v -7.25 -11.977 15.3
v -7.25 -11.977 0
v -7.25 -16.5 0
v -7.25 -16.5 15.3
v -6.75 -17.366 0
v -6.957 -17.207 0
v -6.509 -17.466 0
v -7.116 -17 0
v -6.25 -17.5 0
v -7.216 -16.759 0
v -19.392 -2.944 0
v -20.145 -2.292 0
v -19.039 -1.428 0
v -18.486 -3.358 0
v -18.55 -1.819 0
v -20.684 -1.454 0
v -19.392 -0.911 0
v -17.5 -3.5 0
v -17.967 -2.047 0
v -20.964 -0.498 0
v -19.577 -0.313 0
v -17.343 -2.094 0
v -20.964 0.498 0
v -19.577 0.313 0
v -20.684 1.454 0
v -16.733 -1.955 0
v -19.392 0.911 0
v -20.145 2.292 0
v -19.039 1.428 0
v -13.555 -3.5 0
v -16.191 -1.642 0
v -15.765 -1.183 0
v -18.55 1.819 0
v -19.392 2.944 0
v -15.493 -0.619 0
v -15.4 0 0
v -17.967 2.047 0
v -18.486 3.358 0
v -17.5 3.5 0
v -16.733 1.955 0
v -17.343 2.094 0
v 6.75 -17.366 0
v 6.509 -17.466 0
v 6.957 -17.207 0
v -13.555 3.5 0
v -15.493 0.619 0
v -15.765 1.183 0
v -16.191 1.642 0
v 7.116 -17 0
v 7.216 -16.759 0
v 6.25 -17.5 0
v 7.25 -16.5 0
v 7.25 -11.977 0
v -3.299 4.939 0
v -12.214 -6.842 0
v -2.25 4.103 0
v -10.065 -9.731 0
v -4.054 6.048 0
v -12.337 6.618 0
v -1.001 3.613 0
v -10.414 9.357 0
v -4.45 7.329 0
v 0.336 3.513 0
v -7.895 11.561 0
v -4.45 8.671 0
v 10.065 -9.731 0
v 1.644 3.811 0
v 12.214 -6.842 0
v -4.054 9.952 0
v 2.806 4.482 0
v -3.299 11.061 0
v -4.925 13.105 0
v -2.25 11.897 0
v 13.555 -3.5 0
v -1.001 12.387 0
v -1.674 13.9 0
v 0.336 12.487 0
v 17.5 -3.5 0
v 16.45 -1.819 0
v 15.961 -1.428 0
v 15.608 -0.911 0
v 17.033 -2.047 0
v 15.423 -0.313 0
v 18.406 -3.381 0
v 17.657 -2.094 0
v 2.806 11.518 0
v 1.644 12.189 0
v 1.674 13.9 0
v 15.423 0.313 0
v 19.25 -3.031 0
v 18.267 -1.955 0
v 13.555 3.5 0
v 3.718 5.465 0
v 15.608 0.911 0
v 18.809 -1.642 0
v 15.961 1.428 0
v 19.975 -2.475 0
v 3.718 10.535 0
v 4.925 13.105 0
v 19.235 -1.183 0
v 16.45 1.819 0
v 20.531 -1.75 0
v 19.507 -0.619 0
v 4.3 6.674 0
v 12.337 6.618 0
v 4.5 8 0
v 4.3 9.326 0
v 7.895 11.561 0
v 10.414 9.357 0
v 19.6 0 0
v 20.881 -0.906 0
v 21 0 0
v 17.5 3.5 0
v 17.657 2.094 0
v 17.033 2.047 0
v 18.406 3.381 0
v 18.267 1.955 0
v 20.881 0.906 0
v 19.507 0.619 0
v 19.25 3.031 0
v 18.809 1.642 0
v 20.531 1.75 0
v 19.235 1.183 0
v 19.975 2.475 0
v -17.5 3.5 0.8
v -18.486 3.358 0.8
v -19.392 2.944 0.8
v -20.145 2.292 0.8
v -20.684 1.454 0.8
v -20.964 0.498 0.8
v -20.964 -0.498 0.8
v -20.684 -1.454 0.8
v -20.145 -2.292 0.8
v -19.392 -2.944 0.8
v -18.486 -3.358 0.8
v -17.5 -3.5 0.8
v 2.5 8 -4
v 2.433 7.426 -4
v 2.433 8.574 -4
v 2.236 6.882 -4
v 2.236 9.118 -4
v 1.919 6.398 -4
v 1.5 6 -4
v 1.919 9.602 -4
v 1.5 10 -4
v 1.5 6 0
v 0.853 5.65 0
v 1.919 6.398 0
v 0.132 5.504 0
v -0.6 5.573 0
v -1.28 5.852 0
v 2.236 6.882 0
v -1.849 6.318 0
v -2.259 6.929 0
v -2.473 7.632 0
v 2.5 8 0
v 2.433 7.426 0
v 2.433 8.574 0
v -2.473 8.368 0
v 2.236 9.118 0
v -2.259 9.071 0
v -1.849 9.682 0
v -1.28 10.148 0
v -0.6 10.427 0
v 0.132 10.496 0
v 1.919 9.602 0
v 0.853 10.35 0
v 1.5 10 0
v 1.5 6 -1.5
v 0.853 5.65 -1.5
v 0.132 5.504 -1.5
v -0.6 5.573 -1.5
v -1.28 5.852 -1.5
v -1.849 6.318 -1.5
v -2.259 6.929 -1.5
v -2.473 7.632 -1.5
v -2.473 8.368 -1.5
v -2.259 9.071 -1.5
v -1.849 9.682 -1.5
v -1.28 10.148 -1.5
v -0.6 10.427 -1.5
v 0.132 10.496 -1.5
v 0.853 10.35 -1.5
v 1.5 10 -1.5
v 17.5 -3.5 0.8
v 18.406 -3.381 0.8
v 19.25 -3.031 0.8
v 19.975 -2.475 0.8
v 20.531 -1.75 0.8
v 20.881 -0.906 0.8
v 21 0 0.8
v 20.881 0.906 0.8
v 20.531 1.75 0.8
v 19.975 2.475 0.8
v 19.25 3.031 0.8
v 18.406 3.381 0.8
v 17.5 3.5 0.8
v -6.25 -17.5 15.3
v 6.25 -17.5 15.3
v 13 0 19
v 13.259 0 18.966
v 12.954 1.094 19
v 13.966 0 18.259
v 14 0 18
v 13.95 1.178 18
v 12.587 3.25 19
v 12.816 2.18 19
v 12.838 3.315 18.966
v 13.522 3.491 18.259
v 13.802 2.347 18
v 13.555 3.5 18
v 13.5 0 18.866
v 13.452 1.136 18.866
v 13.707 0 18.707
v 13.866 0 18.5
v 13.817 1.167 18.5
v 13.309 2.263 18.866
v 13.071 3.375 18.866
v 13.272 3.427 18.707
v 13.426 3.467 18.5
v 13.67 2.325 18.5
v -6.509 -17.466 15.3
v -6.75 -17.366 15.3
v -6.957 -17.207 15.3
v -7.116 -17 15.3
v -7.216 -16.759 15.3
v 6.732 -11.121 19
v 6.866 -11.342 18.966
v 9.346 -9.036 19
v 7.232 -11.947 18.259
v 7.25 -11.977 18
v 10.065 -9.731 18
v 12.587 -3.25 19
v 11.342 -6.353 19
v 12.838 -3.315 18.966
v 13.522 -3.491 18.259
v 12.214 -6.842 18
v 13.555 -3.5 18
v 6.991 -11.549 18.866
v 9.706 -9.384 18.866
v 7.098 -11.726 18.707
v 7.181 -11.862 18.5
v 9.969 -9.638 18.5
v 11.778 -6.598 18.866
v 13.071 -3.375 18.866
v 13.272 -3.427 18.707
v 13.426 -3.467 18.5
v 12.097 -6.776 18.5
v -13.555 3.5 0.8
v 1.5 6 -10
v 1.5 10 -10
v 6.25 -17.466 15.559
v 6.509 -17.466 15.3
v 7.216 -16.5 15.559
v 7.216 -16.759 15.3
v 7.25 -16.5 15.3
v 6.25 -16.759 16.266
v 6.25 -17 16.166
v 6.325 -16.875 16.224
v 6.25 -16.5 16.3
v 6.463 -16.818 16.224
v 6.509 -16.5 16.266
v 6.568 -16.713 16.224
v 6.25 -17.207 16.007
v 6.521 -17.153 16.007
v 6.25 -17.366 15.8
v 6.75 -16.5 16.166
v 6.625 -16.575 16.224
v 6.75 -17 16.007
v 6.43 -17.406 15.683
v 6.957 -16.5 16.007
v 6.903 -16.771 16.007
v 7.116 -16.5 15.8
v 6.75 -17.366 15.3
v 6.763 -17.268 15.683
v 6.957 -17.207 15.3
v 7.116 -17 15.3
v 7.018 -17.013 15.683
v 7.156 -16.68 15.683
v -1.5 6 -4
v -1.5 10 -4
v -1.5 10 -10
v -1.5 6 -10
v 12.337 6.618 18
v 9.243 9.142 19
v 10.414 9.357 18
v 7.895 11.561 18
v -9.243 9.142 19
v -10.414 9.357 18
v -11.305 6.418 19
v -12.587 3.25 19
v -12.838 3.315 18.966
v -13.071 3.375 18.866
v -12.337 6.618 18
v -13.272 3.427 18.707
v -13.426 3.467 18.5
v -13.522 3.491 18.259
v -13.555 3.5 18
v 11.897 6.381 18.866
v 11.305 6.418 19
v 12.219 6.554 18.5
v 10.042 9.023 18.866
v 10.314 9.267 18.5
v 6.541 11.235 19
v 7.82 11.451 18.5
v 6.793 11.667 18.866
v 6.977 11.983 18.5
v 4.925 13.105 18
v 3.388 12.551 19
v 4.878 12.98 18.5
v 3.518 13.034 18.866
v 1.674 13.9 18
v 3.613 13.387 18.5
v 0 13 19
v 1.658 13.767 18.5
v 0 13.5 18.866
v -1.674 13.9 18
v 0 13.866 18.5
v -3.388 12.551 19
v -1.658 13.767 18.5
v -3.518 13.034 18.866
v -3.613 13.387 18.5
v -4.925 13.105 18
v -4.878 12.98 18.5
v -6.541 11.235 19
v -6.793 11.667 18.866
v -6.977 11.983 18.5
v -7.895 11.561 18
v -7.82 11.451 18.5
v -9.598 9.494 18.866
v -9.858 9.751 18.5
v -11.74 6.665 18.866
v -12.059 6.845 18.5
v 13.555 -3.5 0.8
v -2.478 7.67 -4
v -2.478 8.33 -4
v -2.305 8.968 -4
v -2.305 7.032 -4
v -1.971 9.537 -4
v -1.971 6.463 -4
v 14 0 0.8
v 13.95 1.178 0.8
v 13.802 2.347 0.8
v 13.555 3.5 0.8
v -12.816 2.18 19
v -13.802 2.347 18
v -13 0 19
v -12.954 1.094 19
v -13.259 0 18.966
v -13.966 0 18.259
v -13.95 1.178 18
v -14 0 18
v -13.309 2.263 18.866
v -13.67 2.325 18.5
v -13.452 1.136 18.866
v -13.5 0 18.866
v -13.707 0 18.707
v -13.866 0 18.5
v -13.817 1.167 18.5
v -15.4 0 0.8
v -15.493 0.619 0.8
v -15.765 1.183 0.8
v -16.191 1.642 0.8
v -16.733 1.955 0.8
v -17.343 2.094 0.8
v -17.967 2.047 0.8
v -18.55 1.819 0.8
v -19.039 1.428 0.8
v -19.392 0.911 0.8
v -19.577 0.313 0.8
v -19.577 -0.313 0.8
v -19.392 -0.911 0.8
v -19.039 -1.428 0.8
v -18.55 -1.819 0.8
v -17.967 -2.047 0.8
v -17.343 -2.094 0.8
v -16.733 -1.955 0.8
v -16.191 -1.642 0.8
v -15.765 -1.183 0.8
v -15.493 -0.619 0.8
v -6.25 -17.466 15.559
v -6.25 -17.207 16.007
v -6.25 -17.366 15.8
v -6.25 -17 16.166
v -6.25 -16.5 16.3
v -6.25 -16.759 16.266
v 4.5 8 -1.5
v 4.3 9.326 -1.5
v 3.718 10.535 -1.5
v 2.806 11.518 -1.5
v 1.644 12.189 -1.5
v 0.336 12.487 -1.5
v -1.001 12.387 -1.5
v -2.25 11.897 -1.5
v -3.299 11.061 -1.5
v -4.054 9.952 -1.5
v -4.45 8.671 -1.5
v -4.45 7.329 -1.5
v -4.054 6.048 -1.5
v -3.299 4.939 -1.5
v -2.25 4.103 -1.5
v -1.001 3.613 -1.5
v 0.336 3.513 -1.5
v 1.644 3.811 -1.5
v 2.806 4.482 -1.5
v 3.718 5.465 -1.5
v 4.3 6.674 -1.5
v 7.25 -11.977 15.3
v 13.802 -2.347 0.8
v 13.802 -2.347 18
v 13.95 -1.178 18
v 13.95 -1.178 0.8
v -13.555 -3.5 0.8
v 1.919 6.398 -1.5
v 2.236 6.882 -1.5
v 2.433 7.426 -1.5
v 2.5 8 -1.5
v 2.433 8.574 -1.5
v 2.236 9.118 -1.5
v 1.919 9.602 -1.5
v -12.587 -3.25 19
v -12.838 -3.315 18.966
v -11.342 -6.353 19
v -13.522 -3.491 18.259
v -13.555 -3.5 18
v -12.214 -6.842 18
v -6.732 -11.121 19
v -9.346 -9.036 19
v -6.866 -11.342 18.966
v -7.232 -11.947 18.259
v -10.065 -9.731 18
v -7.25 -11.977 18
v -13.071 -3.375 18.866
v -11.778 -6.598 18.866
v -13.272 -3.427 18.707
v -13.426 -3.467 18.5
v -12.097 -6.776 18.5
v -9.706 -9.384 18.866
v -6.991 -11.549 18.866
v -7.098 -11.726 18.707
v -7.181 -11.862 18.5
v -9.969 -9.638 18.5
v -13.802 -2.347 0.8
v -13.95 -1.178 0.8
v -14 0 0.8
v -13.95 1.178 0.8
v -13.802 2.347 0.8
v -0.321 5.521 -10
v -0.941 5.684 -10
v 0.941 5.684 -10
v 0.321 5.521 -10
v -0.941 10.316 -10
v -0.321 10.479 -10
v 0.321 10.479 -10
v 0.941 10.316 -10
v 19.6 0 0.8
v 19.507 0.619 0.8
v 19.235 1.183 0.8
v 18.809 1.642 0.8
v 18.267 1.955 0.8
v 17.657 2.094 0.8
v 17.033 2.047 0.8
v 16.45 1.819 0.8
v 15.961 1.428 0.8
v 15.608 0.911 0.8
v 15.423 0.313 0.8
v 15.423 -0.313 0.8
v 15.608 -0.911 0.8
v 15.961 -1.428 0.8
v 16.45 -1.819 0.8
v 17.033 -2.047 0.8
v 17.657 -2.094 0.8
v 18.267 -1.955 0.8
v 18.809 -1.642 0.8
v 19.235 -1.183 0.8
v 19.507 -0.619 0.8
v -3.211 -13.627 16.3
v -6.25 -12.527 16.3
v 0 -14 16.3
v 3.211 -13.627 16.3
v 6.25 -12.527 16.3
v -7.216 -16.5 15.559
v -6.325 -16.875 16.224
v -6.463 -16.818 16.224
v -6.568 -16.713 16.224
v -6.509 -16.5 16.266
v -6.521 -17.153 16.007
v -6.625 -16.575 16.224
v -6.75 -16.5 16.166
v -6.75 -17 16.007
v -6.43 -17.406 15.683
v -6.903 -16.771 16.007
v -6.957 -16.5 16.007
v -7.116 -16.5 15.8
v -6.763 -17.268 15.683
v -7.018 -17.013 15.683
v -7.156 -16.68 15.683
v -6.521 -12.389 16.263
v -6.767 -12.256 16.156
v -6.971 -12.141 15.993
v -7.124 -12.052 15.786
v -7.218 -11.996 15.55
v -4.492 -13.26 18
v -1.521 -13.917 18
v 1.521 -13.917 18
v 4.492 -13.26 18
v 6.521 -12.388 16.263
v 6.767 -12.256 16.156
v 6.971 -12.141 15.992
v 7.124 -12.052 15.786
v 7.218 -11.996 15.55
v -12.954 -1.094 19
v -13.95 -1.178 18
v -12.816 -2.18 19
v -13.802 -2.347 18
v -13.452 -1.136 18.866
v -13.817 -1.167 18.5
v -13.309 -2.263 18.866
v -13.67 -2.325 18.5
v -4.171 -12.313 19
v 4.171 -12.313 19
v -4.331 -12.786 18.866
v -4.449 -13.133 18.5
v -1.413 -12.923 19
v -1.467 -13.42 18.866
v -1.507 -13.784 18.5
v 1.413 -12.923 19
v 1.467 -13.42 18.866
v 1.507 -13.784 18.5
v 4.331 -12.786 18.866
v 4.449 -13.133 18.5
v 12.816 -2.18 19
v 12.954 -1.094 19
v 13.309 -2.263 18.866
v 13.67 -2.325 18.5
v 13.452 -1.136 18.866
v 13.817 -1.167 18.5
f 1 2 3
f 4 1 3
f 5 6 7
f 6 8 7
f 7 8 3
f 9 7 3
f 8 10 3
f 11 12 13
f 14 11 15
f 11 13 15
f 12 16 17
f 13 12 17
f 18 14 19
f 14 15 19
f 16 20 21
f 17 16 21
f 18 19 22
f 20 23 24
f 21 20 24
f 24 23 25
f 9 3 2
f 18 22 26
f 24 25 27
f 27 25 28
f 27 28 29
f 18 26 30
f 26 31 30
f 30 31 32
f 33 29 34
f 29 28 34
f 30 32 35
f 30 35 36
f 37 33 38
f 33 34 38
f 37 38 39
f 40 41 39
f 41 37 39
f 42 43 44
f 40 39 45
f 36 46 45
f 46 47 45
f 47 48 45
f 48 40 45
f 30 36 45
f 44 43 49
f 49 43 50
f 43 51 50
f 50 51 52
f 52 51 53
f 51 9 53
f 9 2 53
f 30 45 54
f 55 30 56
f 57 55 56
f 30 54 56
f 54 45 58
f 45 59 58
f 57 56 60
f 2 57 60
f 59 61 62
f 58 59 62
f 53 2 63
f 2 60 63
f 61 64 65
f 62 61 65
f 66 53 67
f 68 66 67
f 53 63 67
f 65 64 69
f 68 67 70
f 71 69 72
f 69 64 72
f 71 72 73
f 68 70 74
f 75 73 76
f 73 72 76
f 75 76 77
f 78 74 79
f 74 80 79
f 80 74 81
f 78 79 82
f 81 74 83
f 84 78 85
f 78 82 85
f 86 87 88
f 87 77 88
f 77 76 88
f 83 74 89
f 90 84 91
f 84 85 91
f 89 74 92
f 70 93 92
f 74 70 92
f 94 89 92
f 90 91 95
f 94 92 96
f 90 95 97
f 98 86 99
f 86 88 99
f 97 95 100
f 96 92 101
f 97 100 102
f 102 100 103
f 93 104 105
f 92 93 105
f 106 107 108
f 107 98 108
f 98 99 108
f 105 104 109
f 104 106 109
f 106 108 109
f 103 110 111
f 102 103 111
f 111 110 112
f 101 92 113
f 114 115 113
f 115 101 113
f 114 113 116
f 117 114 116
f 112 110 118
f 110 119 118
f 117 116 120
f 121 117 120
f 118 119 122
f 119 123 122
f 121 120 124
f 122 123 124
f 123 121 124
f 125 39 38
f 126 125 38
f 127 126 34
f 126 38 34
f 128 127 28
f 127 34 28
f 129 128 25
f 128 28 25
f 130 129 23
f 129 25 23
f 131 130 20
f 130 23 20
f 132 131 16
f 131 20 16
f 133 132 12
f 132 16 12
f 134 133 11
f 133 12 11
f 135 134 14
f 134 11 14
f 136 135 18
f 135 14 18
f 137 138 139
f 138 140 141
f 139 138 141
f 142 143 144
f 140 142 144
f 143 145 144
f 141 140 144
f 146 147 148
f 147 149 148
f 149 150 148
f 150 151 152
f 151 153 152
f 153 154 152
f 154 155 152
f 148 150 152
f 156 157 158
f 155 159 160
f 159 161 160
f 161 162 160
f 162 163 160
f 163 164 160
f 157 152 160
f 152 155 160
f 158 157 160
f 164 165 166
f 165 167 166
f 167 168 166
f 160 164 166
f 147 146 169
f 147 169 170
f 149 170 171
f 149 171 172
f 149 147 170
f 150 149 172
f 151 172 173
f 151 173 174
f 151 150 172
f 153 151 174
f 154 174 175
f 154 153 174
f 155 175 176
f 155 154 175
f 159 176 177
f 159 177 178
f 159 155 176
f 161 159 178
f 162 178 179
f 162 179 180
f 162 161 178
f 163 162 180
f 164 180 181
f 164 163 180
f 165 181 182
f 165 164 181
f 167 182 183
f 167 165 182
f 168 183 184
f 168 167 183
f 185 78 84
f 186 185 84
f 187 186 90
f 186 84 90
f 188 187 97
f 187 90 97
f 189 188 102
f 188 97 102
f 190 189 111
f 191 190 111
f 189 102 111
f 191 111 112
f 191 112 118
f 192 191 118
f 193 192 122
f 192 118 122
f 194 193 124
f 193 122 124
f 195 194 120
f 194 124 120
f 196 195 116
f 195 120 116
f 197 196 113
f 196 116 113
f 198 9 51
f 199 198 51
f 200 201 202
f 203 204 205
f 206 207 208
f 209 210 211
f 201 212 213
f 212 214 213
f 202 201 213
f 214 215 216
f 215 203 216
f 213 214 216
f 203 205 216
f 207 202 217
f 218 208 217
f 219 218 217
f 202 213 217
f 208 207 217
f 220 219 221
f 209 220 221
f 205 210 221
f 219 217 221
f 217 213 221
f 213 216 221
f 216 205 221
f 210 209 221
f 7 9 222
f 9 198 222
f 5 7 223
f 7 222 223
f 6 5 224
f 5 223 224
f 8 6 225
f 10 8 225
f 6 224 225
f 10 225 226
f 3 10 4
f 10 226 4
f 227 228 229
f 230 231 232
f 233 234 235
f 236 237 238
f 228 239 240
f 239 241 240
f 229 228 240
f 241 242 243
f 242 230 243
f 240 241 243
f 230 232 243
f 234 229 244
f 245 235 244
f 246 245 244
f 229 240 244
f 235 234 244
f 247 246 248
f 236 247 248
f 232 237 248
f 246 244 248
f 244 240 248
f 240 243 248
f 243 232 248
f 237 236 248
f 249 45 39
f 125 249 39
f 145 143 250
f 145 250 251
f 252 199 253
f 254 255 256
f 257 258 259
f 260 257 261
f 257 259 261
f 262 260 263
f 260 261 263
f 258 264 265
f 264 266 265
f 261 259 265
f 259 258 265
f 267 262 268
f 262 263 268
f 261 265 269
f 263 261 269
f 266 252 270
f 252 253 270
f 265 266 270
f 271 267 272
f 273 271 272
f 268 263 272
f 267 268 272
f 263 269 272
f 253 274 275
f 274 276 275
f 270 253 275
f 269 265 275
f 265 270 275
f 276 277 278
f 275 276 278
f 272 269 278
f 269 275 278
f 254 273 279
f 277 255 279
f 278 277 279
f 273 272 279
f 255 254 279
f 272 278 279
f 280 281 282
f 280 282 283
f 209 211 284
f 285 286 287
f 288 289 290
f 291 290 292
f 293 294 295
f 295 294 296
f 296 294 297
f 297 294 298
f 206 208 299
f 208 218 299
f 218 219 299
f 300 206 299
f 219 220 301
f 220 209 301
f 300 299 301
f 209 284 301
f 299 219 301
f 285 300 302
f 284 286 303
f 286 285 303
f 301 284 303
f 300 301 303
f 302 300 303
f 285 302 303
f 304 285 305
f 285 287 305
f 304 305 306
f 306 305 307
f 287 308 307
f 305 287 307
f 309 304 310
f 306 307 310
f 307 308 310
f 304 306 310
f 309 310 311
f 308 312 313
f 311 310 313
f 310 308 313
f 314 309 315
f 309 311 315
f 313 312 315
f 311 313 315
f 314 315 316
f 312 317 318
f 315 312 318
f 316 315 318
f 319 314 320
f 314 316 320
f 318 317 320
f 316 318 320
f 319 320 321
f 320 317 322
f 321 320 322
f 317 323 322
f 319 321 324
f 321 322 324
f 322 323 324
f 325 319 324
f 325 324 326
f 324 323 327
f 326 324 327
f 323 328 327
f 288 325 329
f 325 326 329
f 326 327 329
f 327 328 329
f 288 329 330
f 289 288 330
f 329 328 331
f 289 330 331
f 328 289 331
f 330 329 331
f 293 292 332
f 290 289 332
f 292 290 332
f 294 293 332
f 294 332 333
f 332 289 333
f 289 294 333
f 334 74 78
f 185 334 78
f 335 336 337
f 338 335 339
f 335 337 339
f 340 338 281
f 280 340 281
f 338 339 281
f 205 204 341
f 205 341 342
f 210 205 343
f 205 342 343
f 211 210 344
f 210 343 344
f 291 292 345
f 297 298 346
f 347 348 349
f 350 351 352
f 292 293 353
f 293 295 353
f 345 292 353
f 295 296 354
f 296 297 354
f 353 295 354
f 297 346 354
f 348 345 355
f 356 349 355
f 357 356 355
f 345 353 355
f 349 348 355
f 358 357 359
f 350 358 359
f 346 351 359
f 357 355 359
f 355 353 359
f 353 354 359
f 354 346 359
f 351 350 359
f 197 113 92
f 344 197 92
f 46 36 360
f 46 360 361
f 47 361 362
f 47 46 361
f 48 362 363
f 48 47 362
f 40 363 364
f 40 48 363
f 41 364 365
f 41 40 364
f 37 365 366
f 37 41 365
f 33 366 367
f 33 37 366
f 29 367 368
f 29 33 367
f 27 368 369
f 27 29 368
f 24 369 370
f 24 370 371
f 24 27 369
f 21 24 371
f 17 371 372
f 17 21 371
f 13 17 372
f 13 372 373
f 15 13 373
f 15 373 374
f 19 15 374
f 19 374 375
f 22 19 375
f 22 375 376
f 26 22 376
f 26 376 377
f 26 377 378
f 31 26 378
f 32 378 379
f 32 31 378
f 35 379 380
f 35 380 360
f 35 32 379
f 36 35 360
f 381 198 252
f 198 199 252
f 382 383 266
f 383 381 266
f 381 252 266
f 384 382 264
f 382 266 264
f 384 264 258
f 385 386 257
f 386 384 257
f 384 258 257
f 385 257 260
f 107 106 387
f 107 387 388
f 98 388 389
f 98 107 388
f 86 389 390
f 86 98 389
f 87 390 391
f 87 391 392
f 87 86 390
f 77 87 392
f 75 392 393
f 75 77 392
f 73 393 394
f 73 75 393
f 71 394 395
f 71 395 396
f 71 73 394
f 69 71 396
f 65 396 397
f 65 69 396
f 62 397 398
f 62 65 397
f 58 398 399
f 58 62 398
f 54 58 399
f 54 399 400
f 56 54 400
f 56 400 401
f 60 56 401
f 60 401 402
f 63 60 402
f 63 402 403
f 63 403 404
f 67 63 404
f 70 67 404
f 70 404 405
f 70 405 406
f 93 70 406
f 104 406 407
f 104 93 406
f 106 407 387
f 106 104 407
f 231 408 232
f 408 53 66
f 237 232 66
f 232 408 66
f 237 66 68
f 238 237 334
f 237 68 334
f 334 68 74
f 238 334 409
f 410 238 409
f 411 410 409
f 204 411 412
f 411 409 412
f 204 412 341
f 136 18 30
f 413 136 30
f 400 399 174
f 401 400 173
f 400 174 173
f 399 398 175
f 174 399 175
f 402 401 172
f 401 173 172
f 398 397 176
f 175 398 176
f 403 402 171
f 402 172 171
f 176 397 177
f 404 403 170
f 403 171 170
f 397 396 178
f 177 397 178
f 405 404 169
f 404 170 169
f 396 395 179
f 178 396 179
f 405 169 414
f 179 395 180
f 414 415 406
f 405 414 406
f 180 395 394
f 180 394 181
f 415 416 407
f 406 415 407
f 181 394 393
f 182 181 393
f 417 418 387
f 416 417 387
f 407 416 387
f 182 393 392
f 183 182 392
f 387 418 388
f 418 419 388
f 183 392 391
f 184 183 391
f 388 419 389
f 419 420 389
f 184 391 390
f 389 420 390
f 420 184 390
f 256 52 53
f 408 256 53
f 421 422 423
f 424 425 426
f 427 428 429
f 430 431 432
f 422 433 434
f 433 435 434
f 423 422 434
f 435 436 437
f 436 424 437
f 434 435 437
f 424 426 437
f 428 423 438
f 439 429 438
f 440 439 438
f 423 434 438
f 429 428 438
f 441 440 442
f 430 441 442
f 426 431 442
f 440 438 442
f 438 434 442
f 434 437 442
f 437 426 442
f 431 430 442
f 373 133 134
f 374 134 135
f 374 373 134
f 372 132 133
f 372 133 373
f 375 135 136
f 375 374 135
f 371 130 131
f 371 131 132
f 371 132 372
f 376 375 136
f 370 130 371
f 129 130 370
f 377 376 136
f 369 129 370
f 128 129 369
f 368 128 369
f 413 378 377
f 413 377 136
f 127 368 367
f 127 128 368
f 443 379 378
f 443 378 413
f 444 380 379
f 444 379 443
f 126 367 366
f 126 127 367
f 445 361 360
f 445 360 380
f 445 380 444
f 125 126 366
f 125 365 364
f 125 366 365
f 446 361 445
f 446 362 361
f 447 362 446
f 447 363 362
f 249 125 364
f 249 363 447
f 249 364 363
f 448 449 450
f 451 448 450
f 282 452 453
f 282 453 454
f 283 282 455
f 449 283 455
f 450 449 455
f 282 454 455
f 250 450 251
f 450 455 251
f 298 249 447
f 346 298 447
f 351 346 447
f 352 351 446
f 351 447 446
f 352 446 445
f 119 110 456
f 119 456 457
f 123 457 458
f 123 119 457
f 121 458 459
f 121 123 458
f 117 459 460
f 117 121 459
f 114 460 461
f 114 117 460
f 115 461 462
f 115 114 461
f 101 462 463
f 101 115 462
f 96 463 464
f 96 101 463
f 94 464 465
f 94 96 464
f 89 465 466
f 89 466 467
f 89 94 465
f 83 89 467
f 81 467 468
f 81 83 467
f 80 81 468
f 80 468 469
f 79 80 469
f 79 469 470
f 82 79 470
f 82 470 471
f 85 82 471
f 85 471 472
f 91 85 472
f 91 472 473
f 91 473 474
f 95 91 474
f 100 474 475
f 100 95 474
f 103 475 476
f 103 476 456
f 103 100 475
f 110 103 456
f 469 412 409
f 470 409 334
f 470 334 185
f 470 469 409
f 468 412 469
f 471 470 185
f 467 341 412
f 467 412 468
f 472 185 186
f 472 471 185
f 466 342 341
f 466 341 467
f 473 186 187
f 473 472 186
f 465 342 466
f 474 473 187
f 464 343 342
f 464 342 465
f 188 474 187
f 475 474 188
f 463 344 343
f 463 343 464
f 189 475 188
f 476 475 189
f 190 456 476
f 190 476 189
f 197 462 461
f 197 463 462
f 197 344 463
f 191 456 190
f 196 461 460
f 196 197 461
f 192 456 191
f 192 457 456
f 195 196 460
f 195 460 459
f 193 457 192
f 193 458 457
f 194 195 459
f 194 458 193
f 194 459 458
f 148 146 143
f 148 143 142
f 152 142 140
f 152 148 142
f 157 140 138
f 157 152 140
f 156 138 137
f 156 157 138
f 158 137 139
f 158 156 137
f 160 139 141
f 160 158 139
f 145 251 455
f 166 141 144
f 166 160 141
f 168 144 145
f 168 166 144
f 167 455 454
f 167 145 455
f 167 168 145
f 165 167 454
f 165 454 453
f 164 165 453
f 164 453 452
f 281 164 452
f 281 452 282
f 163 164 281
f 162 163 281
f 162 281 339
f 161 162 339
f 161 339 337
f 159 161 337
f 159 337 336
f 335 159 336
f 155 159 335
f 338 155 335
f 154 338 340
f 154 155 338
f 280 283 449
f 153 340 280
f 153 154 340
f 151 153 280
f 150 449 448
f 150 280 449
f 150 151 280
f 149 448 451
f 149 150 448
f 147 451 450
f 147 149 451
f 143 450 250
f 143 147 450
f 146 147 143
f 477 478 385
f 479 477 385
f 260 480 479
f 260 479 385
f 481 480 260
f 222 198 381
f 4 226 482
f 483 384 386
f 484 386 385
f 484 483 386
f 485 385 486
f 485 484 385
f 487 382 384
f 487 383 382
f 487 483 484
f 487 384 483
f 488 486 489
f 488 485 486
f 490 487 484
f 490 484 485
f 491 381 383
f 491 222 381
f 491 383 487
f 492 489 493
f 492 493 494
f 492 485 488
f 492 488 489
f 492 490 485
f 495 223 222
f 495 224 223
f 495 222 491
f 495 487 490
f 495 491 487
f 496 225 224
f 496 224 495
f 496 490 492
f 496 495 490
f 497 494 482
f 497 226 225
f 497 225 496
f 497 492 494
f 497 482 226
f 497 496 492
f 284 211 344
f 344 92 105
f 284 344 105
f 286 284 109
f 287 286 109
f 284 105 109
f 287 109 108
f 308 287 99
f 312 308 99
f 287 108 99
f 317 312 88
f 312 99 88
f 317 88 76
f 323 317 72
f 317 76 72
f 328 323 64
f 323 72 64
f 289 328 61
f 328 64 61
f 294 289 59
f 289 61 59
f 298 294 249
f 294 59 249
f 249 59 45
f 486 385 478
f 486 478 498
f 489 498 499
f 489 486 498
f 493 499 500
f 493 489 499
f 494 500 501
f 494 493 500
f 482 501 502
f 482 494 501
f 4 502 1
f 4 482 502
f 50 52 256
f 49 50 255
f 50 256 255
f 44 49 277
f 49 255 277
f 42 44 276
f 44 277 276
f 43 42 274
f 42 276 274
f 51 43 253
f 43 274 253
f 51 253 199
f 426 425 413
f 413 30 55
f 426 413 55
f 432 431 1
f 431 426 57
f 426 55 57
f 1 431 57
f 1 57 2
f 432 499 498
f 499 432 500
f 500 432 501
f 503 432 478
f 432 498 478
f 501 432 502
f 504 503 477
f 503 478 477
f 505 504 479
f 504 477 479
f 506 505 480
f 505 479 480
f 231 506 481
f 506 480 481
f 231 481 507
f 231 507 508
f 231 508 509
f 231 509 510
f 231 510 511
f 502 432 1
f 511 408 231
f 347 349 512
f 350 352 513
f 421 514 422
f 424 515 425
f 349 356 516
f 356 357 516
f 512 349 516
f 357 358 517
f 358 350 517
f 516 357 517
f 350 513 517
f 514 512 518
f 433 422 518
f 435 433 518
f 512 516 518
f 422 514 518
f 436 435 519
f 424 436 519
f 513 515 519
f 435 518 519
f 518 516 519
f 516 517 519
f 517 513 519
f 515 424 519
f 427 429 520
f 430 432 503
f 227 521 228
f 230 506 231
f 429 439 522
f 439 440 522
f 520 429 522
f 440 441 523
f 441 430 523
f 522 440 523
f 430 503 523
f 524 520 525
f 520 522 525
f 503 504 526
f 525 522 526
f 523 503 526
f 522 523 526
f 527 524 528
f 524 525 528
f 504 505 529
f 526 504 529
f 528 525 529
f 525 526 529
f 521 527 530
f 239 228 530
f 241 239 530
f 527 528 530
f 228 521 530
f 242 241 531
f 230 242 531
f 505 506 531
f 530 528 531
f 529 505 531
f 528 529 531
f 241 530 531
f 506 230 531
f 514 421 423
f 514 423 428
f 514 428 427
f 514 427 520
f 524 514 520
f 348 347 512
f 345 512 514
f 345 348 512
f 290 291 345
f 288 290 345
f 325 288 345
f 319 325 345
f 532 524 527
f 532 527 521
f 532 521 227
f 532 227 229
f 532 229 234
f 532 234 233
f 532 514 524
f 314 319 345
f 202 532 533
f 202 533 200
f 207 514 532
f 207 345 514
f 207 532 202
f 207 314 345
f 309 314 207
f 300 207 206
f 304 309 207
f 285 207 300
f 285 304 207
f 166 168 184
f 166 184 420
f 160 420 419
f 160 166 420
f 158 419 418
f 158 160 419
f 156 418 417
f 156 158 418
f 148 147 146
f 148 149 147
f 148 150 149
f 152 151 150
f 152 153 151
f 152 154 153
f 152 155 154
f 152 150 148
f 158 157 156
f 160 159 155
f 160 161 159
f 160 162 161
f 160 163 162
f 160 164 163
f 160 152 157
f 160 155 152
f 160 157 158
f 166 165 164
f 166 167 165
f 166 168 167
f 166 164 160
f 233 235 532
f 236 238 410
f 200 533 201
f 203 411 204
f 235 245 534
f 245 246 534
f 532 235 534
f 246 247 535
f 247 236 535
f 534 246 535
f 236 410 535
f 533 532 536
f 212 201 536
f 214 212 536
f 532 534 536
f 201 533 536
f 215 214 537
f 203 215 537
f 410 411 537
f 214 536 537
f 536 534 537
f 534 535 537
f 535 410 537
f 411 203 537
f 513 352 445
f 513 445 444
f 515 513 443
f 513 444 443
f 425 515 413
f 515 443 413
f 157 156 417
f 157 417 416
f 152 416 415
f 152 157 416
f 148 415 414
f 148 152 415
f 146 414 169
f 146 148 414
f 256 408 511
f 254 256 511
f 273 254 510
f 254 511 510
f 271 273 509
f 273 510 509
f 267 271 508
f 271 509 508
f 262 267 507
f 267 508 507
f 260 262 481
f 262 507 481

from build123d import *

# Parameters (mm, degrees)
F0_R     = 4.5
F1_DEPTH = 19
F2_DEPTH = 10
F3_DEPTH = 1.5
F0_R_2   = 2.1
F4_DEPTH = 0.8
F5_DEPTH = 16.3
F6_R     = 1
F7_DEPTH = 4


with BuildPart() as f1:
    # F0 (on Top) → F1 (new body)
    with BuildSketch(Plane.XY):
        with BuildLine():
            ThreePointArc((13.5554417117, -3.5), (13.8884157477, -1.7640600948), (14, 0))
            ThreePointArc((14, 0), (13.8884157477, 1.7640600948), (13.5554417117, 3.5))
            ThreePointArc((13.5554417117, 3.5), (0, 14), (-13.5554417117, 3.5))
            ThreePointArc((-13.5554417117, 3.5), (-13.8884157477, 1.7640600948), (-14, 0))
            ThreePointArc((-14, 0), (-13.8884157477, -1.7640600948), (-13.5554417117, -3.5))
            ThreePointArc((-13.5554417117, -3.5), (-11.2329663029, -8.3558642903), (-7.25, -11.976539567))
            ThreePointArc((-7.25, -11.976539567), (0, -14), (7.25, -11.976539567))
            ThreePointArc((7.25, -11.976539567), (11.2329663029, -8.3558642903), (13.5554417117, -3.5))
        make_face()
        with Locations((0, 8)):
            Circle(F0_R, mode=Mode.SUBTRACT)
        with Locations((0, 8)):
            Circle(F0_R)
        with BuildLine():
            ThreePointArc((1.5, 10), (2.2360679775, 9.1180339887), (2.5, 8))
            ThreePointArc((2.5, 8), (2.2360679775, 6.8819660113), (1.5, 6))
            ThreePointArc((1.5, 6), (0, 5.5), (-1.5, 6))
            ThreePointArc((-1.5, 6), (-2.5, 8), (-1.5, 10))
            ThreePointArc((-1.5, 10), (0, 10.5), (1.5, 10))
        make_face(mode=Mode.SUBTRACT)
        with BuildLine():
            Line((1.5, 6), (1.5, 10))
            ThreePointArc((1.5, 10), (0, 10.5), (-1.5, 10))
            Line((-1.5, 10), (-1.5, 6))
            ThreePointArc((-1.5, 6), (0, 5.5), (1.5, 6))
        make_face()
        with BuildLine():
            ThreePointArc((1.5, 6), (2.2360679775, 6.8819660113), (2.5, 8))
            ThreePointArc((2.5, 8), (2.2360679775, 9.1180339887), (1.5, 10))
            Line((1.5, 10), (1.5, 6))
        make_face()
        with BuildLine():
            Line((-1.5, 6), (-1.5, 10))
            ThreePointArc((-1.5, 10), (-2.5, 8), (-1.5, 6))
        make_face()
    extrude(amount=F1_DEPTH)

    # F0 (on Top) → F3 (join)
    with BuildSketch(Plane.XY):
        with Locations((0, 8)):
            Circle(F0_R)
        with BuildLine():
            ThreePointArc((1.5, 10), (2.2360679775, 9.1180339887), (2.5, 8))
            ThreePointArc((2.5, 8), (2.2360679775, 6.8819660113), (1.5, 6))
            ThreePointArc((1.5, 6), (0, 5.5), (-1.5, 6))
            ThreePointArc((-1.5, 6), (-2.5, 8), (-1.5, 10))
            ThreePointArc((-1.5, 10), (0, 10.5), (1.5, 10))
        make_face(mode=Mode.SUBTRACT)
    extrude(amount=-F3_DEPTH)

    # F0 (on Top) → F4 (join)
    with BuildSketch(Plane.XY):
        with BuildLine():
            ThreePointArc((17.5, -3.5), (15.0251262658, -2.4748737342), (14, 0))
            ThreePointArc((14, 0), (13.8884157477, -1.7640600948), (13.5554417117, -3.5))
            Line((13.5554417117, -3.5), (17.5, -3.5))
        make_face()
        with BuildLine():
            ThreePointArc((17.5, 3.5), (15.0251262658, 2.4748737342), (14, 0))
            ThreePointArc((14, 0), (15.0251262658, -2.4748737342), (17.5, -3.5))
            ThreePointArc((17.5, -3.5), (19.9748737342, -2.4748737342), (21, 0))
            ThreePointArc((21, 0), (19.9748737342, 2.4748737342), (17.5, 3.5))
        make_face()
        with Locations((17.5, 0)):
            Circle(F0_R_2, mode=Mode.SUBTRACT)
        with BuildLine():
            ThreePointArc((13.5554417117, 3.5), (13.8884157477, 1.7640600948), (14, 0))
            ThreePointArc((14, 0), (15.0251262658, 2.4748737342), (17.5, 3.5))
            Line((17.5, 3.5), (13.5554417117, 3.5))
        make_face()
        with BuildLine():
            ThreePointArc((-13.5554417117, -3.5), (-13.8884157477, -1.7640600948), (-14, 0))
            ThreePointArc((-14, 0), (-15.0251262658, -2.4748737342), (-17.5, -3.5))
            Line((-17.5, -3.5), (-13.5554417117, -3.5))
        make_face()
        with BuildLine():
            ThreePointArc((-17.5, -3.5), (-15.0251262658, -2.4748737342), (-14, 0))
            ThreePointArc((-14, 0), (-15.0251262658, 2.4748737342), (-17.5, 3.5))
            ThreePointArc((-17.5, 3.5), (-21, 0), (-17.5, -3.5))
        make_face()
        with Locations((-17.5, 0)):
            Circle(F0_R_2, mode=Mode.SUBTRACT)
        with BuildLine():
            ThreePointArc((-14, 0), (-13.8884157477, 1.7640600948), (-13.5554417117, 3.5))
            Line((-13.5554417117, 3.5), (-17.5, 3.5))
            ThreePointArc((-17.5, 3.5), (-15.0251262658, 2.4748737342), (-14, 0))
        make_face()
    extrude(amount=F4_DEPTH)

    # F0 (on Top) → F5 (join, through all)
    with BuildSketch(Plane.XY):
        with BuildLine():
            Line((7.25, -17.5), (7.25, -11.976539567))
            ThreePointArc((7.25, -11.976539567), (0, -14), (-7.25, -11.976539567))
            Line((-7.25, -11.976539567), (-7.25, -17.5))
            Line((-7.25, -17.5), (7.25, -17.5))
        make_face()
    extrude(amount=F5_DEPTH)

    # F6
    f6_edges = [f1.edges().sort_by_distance(p)[0] for p in [
        (-13.555442, 3.5, 19),
        (-7.25, -17.5, 8.15),
        (7.25, -17.5, 8.15),
        (0, -17.5, 16.3),
        (-7.25, -14.73827, 16.3),
        (7.25, -14.73827, 16.3),
    ]]
    fillet(f6_edges, radius=F6_R)


with BuildPart() as f2:
    # F0 (on Top) → F2 (new body)
    with BuildSketch(Plane.XY):
        with BuildLine():
            Line((1.5, 6), (1.5, 10))
            ThreePointArc((1.5, 10), (0, 10.5), (-1.5, 10))
            Line((-1.5, 10), (-1.5, 6))
            ThreePointArc((-1.5, 6), (0, 5.5), (1.5, 6))
        make_face()
    extrude(amount=-F2_DEPTH)

    # F0 (on Top) → F7 (join)
    with BuildSketch(Plane.XY):
        with BuildLine():
            Line((-1.5, 6), (-1.5, 10))
            ThreePointArc((-1.5, 10), (-2.5, 8), (-1.5, 6))
        make_face()
        with BuildLine():
            ThreePointArc((1.5, 6), (2.2360679775, 6.8819660113), (2.5, 8))
            ThreePointArc((2.5, 8), (2.2360679775, 9.1180339887), (1.5, 10))
            Line((1.5, 10), (1.5, 6))
        make_face()
    extrude(amount=-F7_DEPTH)


solid = Compound([f1.part, f2.part])
